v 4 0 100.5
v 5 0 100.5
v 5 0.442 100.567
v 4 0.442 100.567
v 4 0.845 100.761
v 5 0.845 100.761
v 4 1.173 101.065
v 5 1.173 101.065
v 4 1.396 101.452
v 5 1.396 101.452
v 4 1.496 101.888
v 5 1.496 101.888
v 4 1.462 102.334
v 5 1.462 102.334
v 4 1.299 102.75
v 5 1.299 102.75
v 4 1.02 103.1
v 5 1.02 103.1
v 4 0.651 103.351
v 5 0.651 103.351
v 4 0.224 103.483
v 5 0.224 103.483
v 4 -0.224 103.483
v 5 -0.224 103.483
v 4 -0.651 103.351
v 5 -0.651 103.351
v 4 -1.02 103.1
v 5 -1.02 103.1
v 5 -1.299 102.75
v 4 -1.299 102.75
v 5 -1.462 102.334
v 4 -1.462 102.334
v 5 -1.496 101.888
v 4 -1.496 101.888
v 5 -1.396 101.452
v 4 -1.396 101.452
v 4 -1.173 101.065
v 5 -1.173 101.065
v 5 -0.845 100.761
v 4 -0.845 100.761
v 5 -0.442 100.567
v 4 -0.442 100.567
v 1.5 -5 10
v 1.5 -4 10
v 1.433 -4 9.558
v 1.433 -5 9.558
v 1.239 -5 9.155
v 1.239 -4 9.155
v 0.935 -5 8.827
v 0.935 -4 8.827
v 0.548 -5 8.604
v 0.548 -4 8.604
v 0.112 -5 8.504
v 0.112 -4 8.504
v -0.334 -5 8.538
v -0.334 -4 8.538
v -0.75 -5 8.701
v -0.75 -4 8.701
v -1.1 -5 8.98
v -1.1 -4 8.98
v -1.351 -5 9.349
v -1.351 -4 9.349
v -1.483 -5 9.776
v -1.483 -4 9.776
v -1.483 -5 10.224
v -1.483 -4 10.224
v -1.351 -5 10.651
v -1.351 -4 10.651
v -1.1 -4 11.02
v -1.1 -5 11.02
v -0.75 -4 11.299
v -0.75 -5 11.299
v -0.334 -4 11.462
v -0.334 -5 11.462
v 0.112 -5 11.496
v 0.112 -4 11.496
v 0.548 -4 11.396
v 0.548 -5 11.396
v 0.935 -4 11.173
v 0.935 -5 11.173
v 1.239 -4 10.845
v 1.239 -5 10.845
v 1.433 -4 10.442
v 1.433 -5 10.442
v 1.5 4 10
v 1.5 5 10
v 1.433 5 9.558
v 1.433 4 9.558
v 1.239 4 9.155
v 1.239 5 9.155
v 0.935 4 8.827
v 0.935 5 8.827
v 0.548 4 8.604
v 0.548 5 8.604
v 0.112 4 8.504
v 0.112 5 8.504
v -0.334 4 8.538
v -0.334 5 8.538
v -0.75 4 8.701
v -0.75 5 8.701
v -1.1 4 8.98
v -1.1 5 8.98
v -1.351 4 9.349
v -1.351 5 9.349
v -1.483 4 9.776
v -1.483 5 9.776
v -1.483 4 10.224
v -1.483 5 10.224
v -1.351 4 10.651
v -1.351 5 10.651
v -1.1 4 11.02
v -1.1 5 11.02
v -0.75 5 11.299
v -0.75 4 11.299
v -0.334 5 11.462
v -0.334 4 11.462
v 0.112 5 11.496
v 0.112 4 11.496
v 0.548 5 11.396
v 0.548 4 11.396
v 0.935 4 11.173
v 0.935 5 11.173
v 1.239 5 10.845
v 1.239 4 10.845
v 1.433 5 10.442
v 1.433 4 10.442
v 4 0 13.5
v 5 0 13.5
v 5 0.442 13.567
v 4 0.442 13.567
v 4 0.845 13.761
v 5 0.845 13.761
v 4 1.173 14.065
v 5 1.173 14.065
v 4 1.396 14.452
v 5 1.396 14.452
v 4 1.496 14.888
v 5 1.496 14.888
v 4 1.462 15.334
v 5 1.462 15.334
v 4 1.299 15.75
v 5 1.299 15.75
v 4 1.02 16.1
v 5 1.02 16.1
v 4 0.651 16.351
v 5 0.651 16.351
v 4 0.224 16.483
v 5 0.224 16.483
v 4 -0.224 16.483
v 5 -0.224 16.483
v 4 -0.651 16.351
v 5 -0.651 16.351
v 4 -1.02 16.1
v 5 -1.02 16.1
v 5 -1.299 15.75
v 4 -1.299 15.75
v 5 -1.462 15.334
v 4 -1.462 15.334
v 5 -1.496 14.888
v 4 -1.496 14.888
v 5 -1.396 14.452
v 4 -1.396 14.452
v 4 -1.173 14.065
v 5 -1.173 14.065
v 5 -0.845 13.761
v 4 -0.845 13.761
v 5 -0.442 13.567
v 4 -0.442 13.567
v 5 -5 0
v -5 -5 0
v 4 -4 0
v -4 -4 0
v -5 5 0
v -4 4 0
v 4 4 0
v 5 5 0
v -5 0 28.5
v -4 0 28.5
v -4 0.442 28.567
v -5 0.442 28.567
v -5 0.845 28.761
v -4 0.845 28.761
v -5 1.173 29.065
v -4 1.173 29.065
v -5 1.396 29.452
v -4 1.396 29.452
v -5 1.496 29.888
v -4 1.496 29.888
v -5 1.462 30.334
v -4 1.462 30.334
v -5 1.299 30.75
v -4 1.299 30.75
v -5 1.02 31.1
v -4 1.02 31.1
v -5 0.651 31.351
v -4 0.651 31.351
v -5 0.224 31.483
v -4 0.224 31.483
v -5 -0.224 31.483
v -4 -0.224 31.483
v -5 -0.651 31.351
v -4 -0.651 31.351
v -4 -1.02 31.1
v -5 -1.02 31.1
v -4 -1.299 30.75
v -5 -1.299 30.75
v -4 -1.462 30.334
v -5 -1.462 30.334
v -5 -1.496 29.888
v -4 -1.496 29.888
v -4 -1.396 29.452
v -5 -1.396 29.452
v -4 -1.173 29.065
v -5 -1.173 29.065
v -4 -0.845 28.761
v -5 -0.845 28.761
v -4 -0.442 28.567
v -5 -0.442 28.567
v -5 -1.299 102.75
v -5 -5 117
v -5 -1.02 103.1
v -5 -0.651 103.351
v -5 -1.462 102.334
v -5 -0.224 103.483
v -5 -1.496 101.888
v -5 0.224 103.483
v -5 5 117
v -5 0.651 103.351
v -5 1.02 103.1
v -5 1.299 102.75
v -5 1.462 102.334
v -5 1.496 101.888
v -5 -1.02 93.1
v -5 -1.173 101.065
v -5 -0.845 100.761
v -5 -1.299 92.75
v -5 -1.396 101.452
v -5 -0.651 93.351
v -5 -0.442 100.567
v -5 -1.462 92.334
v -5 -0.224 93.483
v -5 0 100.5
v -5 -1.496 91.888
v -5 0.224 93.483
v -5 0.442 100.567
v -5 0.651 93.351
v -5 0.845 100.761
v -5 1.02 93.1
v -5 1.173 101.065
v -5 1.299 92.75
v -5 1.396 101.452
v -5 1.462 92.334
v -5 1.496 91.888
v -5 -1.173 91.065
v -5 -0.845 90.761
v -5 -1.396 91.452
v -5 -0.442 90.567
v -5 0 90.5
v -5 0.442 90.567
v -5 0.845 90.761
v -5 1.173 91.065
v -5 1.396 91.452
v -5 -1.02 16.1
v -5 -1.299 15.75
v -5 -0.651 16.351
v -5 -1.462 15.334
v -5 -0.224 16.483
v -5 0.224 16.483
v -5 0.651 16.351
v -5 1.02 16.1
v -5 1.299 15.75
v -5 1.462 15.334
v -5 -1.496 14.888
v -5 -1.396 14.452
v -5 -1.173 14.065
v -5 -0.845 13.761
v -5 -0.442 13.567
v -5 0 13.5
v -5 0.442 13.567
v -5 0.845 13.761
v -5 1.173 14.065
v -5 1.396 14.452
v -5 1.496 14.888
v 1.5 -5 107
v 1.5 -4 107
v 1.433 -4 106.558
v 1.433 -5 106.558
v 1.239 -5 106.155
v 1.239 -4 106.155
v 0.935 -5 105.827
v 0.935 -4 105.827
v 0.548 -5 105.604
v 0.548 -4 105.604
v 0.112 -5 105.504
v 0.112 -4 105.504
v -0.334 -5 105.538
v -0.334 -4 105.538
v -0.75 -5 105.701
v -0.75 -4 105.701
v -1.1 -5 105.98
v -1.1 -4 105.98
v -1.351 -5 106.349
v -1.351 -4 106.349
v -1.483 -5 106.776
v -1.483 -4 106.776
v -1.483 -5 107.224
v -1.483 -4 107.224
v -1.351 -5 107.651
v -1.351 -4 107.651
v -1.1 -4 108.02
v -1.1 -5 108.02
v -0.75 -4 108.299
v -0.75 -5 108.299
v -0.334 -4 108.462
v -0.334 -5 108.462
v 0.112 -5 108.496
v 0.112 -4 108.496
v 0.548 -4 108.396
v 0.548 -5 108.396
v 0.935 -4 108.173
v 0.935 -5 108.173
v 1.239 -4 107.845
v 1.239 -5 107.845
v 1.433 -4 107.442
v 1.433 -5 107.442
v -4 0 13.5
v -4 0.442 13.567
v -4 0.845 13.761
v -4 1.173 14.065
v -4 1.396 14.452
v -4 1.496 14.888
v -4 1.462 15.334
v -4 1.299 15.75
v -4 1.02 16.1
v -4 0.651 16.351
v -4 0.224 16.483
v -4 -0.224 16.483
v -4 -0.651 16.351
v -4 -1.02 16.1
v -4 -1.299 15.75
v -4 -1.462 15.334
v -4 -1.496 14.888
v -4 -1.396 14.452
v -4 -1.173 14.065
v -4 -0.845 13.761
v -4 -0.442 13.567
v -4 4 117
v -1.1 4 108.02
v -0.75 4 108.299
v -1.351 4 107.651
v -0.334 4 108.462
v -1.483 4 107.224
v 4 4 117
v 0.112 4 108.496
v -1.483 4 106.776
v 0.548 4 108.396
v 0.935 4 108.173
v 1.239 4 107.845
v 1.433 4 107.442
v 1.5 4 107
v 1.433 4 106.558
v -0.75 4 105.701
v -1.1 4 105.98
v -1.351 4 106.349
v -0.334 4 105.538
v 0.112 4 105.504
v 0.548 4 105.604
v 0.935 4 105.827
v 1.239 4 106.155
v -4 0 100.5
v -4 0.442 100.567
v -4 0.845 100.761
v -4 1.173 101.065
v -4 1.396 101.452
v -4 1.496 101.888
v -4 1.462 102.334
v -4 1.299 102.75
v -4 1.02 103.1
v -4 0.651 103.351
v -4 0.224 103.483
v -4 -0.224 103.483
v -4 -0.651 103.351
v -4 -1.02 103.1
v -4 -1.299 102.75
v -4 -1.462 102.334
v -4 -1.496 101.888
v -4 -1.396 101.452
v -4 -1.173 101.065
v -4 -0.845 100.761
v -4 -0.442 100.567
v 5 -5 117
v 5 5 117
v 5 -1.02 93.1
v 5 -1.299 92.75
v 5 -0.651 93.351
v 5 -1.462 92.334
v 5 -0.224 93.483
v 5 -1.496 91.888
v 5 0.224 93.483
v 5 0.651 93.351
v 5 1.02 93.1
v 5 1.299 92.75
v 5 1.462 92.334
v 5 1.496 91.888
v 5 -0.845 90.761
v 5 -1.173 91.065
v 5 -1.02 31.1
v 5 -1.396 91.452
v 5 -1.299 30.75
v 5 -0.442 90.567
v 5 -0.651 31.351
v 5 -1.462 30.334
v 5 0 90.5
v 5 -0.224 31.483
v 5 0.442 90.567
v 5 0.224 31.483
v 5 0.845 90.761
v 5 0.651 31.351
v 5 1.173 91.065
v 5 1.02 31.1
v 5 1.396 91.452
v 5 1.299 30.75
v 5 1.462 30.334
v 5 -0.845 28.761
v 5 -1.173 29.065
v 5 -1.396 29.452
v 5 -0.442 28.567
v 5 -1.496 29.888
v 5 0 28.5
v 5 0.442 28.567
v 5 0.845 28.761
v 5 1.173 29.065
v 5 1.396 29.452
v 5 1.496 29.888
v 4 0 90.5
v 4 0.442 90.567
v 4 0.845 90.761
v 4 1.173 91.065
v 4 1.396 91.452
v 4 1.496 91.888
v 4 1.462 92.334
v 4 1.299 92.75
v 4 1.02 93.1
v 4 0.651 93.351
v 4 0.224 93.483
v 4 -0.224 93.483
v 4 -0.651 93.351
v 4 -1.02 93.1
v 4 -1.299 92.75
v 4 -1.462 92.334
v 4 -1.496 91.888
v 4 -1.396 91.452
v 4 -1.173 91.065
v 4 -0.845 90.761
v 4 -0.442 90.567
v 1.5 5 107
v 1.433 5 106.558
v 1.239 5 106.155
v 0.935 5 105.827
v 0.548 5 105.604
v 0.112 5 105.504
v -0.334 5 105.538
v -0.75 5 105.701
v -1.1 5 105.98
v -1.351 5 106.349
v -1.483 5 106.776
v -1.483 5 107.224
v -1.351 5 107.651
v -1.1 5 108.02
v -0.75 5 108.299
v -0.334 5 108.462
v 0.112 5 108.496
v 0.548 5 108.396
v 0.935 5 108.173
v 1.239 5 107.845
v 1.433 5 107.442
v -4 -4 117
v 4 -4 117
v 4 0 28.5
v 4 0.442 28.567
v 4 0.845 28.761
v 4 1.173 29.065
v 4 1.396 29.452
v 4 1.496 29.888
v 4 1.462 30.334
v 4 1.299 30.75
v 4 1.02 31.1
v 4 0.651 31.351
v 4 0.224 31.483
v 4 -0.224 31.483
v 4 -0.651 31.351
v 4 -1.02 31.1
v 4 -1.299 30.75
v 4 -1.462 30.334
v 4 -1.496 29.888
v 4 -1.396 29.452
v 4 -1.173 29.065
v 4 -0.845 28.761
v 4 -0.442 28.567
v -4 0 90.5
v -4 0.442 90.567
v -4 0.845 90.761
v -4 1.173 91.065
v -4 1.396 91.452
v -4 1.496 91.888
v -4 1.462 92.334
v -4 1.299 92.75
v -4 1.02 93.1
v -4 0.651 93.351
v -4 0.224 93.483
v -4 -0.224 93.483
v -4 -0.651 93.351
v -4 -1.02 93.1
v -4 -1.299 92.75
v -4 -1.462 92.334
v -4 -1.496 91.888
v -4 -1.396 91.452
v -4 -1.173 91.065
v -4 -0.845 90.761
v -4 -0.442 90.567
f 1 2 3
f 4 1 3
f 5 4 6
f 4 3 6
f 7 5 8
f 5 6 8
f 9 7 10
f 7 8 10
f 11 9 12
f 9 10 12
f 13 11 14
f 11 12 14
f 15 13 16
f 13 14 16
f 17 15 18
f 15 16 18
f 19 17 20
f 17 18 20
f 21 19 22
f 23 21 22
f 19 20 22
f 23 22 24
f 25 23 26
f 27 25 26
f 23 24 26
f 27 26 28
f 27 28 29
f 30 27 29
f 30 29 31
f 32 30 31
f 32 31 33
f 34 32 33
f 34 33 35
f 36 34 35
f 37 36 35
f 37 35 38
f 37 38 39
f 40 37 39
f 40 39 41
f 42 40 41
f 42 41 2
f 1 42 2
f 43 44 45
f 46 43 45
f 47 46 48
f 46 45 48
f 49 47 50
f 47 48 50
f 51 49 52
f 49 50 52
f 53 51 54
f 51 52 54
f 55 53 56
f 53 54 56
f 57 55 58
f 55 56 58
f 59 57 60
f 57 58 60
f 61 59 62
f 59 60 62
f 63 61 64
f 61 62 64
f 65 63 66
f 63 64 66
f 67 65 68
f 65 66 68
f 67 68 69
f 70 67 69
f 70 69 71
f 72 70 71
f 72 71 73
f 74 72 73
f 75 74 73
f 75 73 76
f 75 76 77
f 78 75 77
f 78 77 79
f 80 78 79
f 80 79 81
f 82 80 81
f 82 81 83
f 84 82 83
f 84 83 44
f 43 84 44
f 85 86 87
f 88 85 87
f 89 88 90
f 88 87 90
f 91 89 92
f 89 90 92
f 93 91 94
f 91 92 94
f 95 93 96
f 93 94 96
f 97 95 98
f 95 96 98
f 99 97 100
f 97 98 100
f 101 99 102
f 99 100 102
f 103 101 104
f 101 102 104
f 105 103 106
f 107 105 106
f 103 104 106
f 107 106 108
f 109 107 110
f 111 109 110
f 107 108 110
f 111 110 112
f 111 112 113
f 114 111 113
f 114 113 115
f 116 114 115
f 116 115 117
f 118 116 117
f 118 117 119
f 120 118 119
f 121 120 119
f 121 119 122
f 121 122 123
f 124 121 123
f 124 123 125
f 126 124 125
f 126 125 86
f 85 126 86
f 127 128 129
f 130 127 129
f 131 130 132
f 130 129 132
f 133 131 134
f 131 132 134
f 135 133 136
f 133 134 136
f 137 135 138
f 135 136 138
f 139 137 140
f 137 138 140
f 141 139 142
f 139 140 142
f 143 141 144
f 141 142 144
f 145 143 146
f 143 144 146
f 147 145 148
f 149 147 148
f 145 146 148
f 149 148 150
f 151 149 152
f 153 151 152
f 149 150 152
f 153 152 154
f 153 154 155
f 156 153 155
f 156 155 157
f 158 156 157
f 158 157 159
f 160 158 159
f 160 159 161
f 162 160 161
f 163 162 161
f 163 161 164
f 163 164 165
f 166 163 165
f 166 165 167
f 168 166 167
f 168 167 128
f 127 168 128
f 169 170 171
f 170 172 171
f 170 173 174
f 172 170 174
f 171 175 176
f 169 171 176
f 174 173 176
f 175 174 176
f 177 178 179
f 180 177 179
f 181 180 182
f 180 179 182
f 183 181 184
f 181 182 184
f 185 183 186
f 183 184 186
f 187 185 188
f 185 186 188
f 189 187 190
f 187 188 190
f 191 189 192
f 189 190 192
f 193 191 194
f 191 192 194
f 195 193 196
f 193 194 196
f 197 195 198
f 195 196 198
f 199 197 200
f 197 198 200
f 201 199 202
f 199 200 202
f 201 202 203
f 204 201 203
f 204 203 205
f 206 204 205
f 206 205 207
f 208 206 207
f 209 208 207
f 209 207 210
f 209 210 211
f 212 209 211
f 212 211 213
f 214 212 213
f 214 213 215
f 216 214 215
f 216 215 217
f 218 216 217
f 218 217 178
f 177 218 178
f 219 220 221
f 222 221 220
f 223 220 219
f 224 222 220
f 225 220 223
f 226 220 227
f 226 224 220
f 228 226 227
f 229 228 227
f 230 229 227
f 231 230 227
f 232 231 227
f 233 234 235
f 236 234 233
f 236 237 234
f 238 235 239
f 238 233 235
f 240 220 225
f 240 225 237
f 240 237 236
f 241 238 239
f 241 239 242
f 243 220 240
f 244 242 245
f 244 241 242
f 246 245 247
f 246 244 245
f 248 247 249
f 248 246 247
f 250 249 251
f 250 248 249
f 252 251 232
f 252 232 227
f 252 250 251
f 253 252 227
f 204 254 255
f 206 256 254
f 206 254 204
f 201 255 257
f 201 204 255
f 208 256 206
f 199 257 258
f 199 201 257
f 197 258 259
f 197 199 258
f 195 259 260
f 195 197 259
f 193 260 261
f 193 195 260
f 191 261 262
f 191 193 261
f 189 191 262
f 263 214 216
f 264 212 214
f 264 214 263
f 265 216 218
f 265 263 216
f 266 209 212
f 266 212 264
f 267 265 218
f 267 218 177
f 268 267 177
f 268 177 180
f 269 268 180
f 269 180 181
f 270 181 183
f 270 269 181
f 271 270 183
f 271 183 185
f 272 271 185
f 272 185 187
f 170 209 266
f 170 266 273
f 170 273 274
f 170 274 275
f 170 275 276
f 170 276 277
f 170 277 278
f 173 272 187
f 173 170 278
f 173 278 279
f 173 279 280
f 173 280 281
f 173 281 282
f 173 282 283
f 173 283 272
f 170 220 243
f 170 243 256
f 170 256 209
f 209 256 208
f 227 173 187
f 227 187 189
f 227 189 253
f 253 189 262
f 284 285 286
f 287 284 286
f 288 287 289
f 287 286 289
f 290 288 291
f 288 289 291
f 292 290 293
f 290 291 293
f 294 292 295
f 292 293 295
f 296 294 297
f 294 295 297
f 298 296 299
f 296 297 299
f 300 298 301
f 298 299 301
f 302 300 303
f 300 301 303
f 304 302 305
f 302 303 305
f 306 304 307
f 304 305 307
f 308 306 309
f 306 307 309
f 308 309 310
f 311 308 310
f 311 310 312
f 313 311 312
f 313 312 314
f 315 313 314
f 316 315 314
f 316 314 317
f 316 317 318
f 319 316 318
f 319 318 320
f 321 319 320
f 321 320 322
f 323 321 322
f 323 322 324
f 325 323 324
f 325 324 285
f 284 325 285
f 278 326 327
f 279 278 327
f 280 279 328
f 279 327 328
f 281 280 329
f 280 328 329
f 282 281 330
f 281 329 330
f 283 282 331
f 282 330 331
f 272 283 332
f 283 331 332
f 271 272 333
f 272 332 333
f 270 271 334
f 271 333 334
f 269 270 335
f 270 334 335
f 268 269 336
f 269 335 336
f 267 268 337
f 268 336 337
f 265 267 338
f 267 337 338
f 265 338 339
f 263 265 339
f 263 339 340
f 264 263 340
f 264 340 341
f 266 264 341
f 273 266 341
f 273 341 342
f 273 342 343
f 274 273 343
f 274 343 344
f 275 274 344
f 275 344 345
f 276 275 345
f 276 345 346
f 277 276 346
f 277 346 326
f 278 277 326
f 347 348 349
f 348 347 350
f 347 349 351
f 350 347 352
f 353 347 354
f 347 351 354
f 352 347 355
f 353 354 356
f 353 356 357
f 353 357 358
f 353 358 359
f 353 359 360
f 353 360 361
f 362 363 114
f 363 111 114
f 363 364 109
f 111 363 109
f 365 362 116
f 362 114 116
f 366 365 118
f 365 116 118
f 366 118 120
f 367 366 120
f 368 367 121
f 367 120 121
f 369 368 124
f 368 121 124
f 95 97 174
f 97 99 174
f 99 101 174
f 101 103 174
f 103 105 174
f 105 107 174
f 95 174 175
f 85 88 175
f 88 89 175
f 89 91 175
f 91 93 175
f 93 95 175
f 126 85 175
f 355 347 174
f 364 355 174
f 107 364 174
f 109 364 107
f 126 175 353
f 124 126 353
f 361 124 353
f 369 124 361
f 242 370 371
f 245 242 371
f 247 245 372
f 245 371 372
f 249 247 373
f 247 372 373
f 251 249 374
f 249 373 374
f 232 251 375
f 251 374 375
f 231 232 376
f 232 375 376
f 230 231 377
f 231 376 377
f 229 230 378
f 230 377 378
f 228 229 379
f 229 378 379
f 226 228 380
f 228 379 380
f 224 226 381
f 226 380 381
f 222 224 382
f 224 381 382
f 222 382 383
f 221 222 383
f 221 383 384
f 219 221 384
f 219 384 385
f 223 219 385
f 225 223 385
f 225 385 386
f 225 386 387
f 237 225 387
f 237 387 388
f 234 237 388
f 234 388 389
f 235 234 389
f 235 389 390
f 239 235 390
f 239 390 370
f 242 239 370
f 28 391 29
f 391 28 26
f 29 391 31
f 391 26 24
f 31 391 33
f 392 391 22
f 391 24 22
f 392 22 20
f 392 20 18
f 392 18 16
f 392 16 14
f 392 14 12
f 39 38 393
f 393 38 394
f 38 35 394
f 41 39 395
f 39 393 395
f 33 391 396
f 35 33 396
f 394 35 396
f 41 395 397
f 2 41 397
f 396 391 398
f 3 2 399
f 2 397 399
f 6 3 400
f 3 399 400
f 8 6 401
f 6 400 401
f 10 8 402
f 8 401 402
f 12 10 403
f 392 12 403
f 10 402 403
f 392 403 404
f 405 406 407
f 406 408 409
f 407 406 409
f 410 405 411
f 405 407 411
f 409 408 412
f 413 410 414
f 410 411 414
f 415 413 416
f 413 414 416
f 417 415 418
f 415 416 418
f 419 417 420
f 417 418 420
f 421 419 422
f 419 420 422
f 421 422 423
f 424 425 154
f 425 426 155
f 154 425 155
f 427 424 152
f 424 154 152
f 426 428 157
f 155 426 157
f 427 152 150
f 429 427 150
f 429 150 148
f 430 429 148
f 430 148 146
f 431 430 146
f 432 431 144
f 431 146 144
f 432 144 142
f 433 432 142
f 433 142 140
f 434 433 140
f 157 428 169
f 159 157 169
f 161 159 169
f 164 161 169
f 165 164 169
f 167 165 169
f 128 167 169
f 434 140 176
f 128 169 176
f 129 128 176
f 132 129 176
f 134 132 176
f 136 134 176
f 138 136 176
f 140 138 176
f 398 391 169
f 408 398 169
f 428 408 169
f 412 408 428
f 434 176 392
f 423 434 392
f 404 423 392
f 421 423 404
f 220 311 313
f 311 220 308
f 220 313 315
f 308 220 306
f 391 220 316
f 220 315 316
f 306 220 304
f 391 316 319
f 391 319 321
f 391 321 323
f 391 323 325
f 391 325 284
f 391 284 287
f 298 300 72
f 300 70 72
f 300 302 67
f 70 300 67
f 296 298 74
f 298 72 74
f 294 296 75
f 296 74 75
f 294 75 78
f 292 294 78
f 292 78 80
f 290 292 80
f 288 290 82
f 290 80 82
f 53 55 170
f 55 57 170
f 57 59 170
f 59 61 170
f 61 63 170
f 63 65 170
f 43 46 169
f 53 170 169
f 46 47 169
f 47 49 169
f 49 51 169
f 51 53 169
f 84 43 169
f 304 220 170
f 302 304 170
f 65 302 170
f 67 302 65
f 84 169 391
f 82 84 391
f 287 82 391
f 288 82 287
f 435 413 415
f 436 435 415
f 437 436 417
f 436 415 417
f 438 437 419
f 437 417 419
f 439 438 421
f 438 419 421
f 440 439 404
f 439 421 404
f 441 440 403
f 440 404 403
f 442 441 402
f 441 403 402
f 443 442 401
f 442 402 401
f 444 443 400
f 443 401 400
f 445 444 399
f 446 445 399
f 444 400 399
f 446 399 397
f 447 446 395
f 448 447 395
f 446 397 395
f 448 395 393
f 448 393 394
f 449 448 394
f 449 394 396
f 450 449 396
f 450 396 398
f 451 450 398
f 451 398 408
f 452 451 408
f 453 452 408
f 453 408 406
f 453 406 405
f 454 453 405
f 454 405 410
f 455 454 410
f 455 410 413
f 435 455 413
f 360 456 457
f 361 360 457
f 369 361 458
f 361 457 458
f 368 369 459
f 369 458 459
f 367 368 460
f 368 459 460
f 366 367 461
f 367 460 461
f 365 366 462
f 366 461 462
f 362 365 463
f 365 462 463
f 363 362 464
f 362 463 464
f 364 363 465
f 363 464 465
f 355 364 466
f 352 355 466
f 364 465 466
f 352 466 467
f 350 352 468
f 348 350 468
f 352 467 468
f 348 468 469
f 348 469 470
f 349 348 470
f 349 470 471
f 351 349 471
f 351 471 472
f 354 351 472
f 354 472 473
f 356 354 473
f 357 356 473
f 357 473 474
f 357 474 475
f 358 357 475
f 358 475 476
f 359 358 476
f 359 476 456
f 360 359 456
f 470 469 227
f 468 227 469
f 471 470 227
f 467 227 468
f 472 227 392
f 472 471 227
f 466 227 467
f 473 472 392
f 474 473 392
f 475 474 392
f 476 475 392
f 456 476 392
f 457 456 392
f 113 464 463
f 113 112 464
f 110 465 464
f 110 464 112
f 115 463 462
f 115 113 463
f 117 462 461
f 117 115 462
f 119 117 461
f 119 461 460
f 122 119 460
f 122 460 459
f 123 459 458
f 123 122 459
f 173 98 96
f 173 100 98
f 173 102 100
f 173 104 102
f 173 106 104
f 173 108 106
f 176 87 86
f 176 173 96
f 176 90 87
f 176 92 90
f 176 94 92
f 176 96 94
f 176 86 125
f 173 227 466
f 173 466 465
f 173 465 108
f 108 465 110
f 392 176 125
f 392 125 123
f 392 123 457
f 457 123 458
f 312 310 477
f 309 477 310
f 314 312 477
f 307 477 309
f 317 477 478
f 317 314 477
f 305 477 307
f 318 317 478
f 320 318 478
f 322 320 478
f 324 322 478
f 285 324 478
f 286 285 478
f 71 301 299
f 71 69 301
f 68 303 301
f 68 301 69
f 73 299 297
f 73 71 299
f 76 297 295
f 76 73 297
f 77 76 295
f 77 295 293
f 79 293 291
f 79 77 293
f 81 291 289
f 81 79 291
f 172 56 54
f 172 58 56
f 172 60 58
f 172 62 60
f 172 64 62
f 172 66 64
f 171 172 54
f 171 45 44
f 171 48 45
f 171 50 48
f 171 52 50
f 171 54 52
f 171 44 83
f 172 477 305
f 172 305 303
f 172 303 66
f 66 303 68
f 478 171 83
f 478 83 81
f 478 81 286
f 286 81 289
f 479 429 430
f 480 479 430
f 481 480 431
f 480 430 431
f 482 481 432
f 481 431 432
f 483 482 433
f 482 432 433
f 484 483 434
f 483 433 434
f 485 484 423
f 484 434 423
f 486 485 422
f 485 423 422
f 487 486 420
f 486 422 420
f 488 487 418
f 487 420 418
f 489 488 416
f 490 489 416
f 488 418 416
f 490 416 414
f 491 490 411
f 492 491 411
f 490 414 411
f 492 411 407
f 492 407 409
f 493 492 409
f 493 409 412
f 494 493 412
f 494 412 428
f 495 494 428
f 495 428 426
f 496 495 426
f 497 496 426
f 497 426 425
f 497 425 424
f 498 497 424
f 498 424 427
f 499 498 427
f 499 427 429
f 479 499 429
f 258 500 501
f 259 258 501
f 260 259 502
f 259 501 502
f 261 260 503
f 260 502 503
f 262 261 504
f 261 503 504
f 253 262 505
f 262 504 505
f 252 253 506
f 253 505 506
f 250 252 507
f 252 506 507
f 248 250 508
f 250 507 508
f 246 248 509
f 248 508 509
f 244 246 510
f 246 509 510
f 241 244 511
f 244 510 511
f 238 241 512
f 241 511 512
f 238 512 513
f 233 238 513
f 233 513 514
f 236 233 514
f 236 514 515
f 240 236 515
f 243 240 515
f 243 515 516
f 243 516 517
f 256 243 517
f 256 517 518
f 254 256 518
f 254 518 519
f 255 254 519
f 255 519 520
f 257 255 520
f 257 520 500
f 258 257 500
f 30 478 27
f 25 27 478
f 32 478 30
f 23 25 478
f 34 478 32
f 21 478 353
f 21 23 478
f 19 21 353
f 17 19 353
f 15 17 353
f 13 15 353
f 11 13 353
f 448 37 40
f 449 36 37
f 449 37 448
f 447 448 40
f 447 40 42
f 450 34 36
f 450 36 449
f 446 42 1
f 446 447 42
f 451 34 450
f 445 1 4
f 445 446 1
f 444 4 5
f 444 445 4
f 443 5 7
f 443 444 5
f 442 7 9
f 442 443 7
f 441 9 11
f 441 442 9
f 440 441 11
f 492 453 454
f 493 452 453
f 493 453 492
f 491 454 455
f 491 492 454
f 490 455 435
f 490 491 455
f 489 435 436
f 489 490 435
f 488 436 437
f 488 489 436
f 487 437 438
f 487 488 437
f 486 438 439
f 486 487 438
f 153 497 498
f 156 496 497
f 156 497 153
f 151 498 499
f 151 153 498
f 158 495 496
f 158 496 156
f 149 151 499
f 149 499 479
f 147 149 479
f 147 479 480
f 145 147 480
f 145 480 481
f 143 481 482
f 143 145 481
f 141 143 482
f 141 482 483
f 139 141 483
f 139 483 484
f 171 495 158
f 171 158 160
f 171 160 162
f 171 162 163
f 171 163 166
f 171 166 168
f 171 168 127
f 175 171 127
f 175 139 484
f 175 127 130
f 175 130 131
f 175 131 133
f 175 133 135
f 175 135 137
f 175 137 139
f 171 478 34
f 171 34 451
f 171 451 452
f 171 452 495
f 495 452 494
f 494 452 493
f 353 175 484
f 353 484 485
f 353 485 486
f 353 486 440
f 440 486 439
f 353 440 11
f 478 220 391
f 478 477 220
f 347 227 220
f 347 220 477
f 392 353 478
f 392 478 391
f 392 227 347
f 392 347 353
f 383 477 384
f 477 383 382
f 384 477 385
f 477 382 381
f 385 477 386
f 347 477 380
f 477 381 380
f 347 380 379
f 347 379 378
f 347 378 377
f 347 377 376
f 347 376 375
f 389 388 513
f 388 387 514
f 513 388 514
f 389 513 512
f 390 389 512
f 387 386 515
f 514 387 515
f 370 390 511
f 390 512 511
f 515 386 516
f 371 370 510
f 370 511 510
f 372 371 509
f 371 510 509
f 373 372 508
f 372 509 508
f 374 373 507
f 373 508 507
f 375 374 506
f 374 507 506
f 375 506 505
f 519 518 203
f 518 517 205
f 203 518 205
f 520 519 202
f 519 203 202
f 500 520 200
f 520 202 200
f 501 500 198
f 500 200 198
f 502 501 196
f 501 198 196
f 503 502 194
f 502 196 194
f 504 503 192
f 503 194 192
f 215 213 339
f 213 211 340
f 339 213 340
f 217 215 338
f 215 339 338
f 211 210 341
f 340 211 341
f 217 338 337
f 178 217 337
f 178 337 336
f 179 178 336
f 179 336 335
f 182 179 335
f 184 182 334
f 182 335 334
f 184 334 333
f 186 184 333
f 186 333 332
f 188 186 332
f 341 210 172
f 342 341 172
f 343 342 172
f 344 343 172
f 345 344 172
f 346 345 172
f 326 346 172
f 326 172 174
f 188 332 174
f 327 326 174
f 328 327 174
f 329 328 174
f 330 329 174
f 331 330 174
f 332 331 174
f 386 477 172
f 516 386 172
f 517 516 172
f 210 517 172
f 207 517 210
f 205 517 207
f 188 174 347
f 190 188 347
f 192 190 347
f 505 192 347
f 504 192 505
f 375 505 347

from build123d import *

# Parameters (mm, degrees)
SKETCH_1_W          = 10
SKETCH_1_H          = 10
SKETCH_1_W_2        = 8
SKETCH_1_H_2        = 8
EXTRUDE_1_DEPTH     = 117
SKETCH_2_R          = 1.5
CUT_EXTRUDE_1_DEPTH = 11
SKETCH_3_R          = 1.5
CUT_EXTRUDE_2_DEPTH = 10


with BuildPart() as part:
    # 草图1 → 拉伸-薄壁1 (new body)
    with BuildSketch(Plane.XY):
        Rectangle(SKETCH_1_W, SKETCH_1_H)
        Rectangle(SKETCH_1_W_2, SKETCH_1_H_2, mode=Mode.SUBTRACT)
    extrude(amount=EXTRUDE_1_DEPTH)

    # 草图2 → 切除-拉伸1 (cut, through all)
    with BuildSketch(Plane(origin=(0, 5, 0), x_dir=(1, 0, 0), z_dir=(0, 1, 0))):
        with Locations((0, -10)):
            Circle(SKETCH_2_R)
        with Locations((0, -107)):
            Circle(SKETCH_2_R)
    extrude(amount=-CUT_EXTRUDE_1_DEPTH, mode=Mode.SUBTRACT)

    # 草图3 → 切除-拉伸2 (cut)
    with BuildSketch(Plane(origin=(5, 0, 0), x_dir=(0, 0, -1), z_dir=(1, 0, 0))):
        with Locations((-15, 0)):
            Circle(SKETCH_3_R)
        with Locations((-30, 0)):
            Circle(SKETCH_3_R)
        with Locations((-102, 0)):
            Circle(SKETCH_3_R)
        with Locations((-92, 0)):
            Circle(SKETCH_3_R)
    extrude(amount=-CUT_EXTRUDE_2_DEPTH, mode=Mode.SUBTRACT)


solid = part.part
